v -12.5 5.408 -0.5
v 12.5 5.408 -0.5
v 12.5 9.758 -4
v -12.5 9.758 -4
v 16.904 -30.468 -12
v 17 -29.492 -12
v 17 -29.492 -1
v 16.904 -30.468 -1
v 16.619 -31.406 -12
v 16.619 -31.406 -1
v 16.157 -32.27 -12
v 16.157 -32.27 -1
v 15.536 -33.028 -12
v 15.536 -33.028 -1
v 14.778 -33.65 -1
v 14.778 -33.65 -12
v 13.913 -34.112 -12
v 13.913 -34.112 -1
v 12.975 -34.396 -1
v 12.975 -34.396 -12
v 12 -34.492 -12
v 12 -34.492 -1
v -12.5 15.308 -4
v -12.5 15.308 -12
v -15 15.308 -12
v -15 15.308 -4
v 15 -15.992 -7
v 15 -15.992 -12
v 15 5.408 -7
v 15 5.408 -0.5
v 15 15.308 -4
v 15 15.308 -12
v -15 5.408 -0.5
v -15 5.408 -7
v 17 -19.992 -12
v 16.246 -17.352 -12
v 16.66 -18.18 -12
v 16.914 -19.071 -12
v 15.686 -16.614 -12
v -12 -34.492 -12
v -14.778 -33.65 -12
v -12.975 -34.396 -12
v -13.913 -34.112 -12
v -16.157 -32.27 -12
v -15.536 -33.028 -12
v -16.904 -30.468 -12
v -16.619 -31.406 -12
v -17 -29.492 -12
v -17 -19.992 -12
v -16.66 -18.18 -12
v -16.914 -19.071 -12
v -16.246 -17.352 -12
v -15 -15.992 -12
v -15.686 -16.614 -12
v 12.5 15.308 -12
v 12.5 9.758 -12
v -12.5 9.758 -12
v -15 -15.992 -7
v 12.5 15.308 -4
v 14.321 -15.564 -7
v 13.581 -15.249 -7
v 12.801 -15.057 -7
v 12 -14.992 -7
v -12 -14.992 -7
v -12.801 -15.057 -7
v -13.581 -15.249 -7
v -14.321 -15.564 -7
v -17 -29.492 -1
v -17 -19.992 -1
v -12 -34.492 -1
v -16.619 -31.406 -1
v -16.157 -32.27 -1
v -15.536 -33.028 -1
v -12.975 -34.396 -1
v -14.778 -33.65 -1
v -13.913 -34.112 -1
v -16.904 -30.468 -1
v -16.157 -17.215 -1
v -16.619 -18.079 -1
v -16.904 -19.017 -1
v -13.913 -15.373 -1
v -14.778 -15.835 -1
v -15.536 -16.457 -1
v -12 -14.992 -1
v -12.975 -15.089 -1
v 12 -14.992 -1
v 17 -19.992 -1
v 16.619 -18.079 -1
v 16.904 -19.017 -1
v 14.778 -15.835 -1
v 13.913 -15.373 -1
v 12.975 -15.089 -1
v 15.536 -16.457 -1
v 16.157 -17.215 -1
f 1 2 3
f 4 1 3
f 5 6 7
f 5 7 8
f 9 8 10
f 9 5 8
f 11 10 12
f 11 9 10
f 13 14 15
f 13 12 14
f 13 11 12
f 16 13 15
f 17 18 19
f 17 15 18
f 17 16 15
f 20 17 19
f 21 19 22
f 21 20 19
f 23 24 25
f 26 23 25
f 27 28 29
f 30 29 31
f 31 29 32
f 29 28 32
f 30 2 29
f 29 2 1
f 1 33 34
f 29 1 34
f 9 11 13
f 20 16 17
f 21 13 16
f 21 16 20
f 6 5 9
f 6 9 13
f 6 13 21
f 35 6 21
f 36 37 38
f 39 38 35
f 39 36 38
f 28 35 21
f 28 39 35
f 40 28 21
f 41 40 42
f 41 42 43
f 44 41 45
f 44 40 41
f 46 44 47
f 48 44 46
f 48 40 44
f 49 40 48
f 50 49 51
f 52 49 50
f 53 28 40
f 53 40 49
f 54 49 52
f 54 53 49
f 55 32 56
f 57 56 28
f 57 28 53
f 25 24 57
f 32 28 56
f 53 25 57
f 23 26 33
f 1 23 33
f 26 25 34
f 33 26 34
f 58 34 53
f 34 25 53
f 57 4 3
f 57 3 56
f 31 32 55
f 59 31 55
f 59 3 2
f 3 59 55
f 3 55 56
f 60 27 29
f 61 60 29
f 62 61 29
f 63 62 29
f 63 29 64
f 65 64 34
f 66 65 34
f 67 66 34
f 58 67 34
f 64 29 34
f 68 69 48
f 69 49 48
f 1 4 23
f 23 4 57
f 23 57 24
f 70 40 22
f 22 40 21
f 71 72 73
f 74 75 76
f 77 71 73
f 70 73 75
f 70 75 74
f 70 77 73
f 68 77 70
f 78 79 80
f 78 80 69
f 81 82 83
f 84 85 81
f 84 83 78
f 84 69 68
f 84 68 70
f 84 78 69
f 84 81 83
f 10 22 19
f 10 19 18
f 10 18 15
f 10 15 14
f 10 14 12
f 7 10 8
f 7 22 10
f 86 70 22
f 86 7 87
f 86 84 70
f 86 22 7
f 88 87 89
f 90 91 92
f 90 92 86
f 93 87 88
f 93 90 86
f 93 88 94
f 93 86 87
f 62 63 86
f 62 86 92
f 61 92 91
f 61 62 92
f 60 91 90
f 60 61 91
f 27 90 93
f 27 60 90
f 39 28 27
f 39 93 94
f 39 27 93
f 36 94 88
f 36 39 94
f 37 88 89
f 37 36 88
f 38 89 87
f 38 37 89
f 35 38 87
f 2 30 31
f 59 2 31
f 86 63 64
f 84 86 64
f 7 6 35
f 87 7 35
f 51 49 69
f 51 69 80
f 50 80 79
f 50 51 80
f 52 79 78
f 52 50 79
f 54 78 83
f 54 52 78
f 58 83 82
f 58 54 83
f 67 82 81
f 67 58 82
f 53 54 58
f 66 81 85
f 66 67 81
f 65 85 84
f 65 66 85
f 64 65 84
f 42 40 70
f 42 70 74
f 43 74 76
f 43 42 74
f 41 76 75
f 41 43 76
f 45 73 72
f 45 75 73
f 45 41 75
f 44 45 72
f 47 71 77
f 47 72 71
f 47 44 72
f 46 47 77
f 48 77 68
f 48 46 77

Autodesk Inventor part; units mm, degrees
ref_plane "YZ Plane" through (0, 0, 0) normal (1, 0, 0) x (0, 1, 0)
ref_plane "XZ Plane" through (0, 0, 0) normal (0, 1, 0) x (-1, 0, 0)
ref_plane "XY Plane" through (0, 0, 0) normal (0, 0, 1) x (1, 0, 0)
ref_plane "Work Plane2" through (0, 5.2982, -18) normal (0, 0, -1) x (-1, 0, 0)
ref_plane "Work Plane4" through (0, -4.9464, -12) normal (0, 0, -1) x (-1, 0, 0)
ref_plane "Work Plane3" through (0, -4.9464, -7) normal (0, 0, -1) x (-1, 0, 0)
sketch "Sketch3" plane through (0, 5.2982, -18) normal (0, 0, -1) x (-1, 0, 0)
  line L0 (13, 53.6093) -> (-13, 53.6093) projected
  arc A0 (-13, 53.6093) -> (-30, 36.6093) centre (-13, 36.6093) ccw projected
  line L1 (-30, 36.6093) -> (-30, -44.3907) projected
  line L2 (-30, -44.3907) -> (30, -44.3907) projected
  line L3 (30, -44.3907) -> (30, 36.6093) projected
  arc A1 (30, 36.6093) -> (13, 53.6093) centre (13, 36.6093) ccw projected
  line L4 (-0.95, 23.6093) -> (-0.95, 40.6093) projected
  line L5 (-0.95, 40.6093) -> (0.95, 40.6093) projected
  line L6 (0.95, 40.6093) -> (0.95, 23.6093) projected
  line L7 (0.95, 23.6093) -> (-0.95, 23.6093) projected
  line L8 (6.55, 40.6093) -> (8.45, 40.6093) projected
  line L9 (8.45, 40.6093) -> (8.45, 23.6093) projected
  line L10 (8.45, 23.6093) -> (6.55, 23.6093) projected
  line L11 (6.55, 23.6093) -> (6.55, 40.6093) projected
  line L12 (-8.45, 40.6093) -> (-6.55, 40.6093) projected
  line L13 (-6.55, 40.6093) -> (-6.55, 23.6093) projected
  line L14 (-6.55, 23.6093) -> (-8.45, 23.6093) projected
  line L15 (-8.45, 23.6093) -> (-8.45, 40.6093) projected
  line L16 (-15.5, -21.0481) -> (-15.5, 10.5093) projected
  line L17 (-15.5, 10.5093) -> (-12, 10.5093) projected
  line L18 (-12, 10.5093) -> (-12, 4.9593) projected
  line L19 (-12, 4.9593) -> (12, 4.9593) projected
  line L20 (12, 4.9593) -> (12, 10.5093) projected
  line L21 (12, 10.5093) -> (15.5, 10.5093) projected
  line L22 (15.5, 10.5093) -> (15.5, -21.0481) projected
  arc A2 (17.5, -25.2907) -> (15.5, -21.0481) centre (12, -25.2907) ccw projected
  line L23 (17.5, -25.2907) -> (17.5, -34.7907) projected
  arc A3 (12, -40.2907) -> (17.5, -34.7907) centre (12, -34.7907) ccw projected
  line L24 (12, -40.2907) -> (-12, -40.2907) projected
  arc A4 (-17.5, -34.7907) -> (-12, -40.2907) centre (-12, -34.7907) ccw projected
  line L25 (-17.5, -34.7907) -> (-17.5, -25.2907) projected
  arc A5 (-15.5, -21.0481) -> (-17.5, -25.2907) centre (-12, -25.2907) ccw projected
  line L26 (-15.5, -0.3907) -> (15.5, -0.3907) projected
  line L27 (-15.5, -21.0481) -> (-15.5, -0.3907) projected
  arc A6 (-12, -19.7907) -> (-15.5, -21.0481) centre (-12, -25.2907) ccw projected
  line L28 (12, -19.7907) -> (-12, -19.7907) projected
  arc A7 (15.5, -21.0481) -> (12, -19.7907) centre (12, -25.2907) ccw projected
  line L29 (15.5, -0.3907) -> (15.5, -21.0481) projected
  arc A8 (-15, -21.2907) -> (-17, -25.2907) centre (-12, -25.2907) ccw
  line L30 (-17, -25.2907) -> (-17, -34.7907)
  arc A9 (-17, -34.7907) -> (-12, -39.7907) centre (-12, -34.7907) ccw
  line L31 (-12, -39.7907) -> (12, -39.7907)
  arc A10 (12, -39.7907) -> (17, -34.7907) centre (12, -34.7907) ccw
  line L32 (17, -34.7907) -> (17, -25.2907)
  arc A11 (17, -25.2907) -> (15, -21.2907) centre (12, -25.2907) ccw
  line L33 (-15, -21.2907) -> (-15, 10.0093)
  line L34 (-15, 10.0093) -> (-12.5, 10.0093)
  line L35 (-12.5, 10.0093) -> (-12.5, 4.4593)
  line L36 (-12.5, 4.4593) -> (12.5, 4.4593)
  line L37 (12.5, 4.4593) -> (12.5, 10.0093)
  line L38 (12.5, 10.0093) -> (15, 10.0093)
  line L39 (15, 10.0093) -> (15, -21.2907)
  point P0 (0, -5.2982)
  dimension "d3" = 0.5
  dimension "d4" = 0.5
extrude "Extrusion1" add sketch "Sketch3" against normal up to surface (5 mm away) from surface at -6 contours L33 L26 L39 A7 L28 A6 | A6 L28 A7 L39 A11 L32 A10 L31 A9 L30 A8 L33 | L33 L34 L35 L36 L37 L38 L39 L26
sketch "Sketch4" plane through (-12.5, 9.7575, -7) normal (0, 0, 1) x (1, 0, 0)
  line L0 (29.5, -39.25) -> (29.5, -29.75) projected
  arc A0 (29.5, -29.75) -> (27.5, -25.75) centre (24.5, -29.75) ccw projected
  line L1 (27.5, -25.75) -> (27.5, 5.55) projected
  line L2 (27.5, 5.55) -> (25, 5.55) projected
  line L3 (25, 5.55) -> (25, 0) projected
  line L4 (25, 0) -> (0, 0) projected
  line L5 (0, 0) -> (0, 5.55) projected
  line L6 (0, 5.55) -> (-2.5, 5.55) projected
  line L7 (-2.5, 5.55) -> (-2.5, -25.75) projected
  arc A1 (-2.5, -25.75) -> (-4.5, -29.75) centre (0.5, -29.75) ccw projected
  line L8 (-4.5, -29.75) -> (-4.5, -39.25) projected
  arc A2 (-4.5, -39.25) -> (0.5, -44.25) centre (0.5, -39.25) ccw projected
  line L9 (0.5, -44.25) -> (24.5, -44.25) projected
  arc A3 (24.5, -44.25) -> (29.5, -39.25) centre (24.5, -39.25) ccw projected
  line L10 (0.5, -24.25) -> (24.5, -24.25) projected
  arc A4 (0.5, -24.25) -> (-3, -25.5074) centre (0.5, -29.75) ccw projected
  arc A5 (28, -25.5074) -> (24.5, -24.25) centre (24.5, -29.75) ccw projected
  arc A6 (27.5, -25.75) -> (24.5, -24.75) centre (24.5, -29.75) ccw
  line L11 (24.5, -24.75) -> (0.5, -24.75)
  arc A7 (0.5, -24.75) -> (-2.5, -25.75) centre (0.5, -29.75) ccw
  point P0 (12.5, -9.7575)
extrude "Extrusion2" add sketch "Sketch4" along normal blind 6 contours A3 L9 A2 L8 A1 A7 L11 A6 A0 L0
sketch "Sketch5" plane through (0, 0, 0) normal (1, 0, 0) x (0, 1, 0)
  line L0 (9.7575, -7) -> (15.3075, -7) projected
  line L1 (4.9075, -6.5) -> (4.9075, -4) projected
  line L2 (15.8075, -4) -> (15.8075, -18) projected
  line L3 (15.3075, -7) -> (-15.9925, -7) projected
  line L4 (4.9075, -4) -> (15.8075, -4) projected
  line L5 (5.4075, -0.5) -> (5.4075, -7)
  line L6 (5.4075, -0.5) -> (15.3075, -4)
  line L7 (15.3075, -4) -> (15.3075, -7)
  point P0 (0, 0)
  dimension "d10" = 0.5
  dimension "d11" = 3.5
extrude "Extrusion3" add sketch "Sketch5" against normal up to surface (2.5 mm away) from surface at 15
mirror "Mirror1" about plane through (0, 0, 0) normal (1, 0, 0) of "Extrusion3"
sketch "Sketch6" plane through (0, 0, 0) normal (1, 0, 0) x (0, 1, 0)
  line L0 (5.4075, -7) -> (9.7575, -7) projected
  line L1 (5.4075, -0.5) -> (5.4075, -7) projected
  line L2 (5.4075, -0.5) -> (9.7575, -4)
  line L3 (9.7575, -4) -> (9.7575, -7)
  point P0 (0, 0)
  point P1 (15.3075, -4)
extrude "Extrusion4" add sketch "Sketch6" along normal up to surface (25 mm away) from surface at -12.5
properties part number "schnapper"
